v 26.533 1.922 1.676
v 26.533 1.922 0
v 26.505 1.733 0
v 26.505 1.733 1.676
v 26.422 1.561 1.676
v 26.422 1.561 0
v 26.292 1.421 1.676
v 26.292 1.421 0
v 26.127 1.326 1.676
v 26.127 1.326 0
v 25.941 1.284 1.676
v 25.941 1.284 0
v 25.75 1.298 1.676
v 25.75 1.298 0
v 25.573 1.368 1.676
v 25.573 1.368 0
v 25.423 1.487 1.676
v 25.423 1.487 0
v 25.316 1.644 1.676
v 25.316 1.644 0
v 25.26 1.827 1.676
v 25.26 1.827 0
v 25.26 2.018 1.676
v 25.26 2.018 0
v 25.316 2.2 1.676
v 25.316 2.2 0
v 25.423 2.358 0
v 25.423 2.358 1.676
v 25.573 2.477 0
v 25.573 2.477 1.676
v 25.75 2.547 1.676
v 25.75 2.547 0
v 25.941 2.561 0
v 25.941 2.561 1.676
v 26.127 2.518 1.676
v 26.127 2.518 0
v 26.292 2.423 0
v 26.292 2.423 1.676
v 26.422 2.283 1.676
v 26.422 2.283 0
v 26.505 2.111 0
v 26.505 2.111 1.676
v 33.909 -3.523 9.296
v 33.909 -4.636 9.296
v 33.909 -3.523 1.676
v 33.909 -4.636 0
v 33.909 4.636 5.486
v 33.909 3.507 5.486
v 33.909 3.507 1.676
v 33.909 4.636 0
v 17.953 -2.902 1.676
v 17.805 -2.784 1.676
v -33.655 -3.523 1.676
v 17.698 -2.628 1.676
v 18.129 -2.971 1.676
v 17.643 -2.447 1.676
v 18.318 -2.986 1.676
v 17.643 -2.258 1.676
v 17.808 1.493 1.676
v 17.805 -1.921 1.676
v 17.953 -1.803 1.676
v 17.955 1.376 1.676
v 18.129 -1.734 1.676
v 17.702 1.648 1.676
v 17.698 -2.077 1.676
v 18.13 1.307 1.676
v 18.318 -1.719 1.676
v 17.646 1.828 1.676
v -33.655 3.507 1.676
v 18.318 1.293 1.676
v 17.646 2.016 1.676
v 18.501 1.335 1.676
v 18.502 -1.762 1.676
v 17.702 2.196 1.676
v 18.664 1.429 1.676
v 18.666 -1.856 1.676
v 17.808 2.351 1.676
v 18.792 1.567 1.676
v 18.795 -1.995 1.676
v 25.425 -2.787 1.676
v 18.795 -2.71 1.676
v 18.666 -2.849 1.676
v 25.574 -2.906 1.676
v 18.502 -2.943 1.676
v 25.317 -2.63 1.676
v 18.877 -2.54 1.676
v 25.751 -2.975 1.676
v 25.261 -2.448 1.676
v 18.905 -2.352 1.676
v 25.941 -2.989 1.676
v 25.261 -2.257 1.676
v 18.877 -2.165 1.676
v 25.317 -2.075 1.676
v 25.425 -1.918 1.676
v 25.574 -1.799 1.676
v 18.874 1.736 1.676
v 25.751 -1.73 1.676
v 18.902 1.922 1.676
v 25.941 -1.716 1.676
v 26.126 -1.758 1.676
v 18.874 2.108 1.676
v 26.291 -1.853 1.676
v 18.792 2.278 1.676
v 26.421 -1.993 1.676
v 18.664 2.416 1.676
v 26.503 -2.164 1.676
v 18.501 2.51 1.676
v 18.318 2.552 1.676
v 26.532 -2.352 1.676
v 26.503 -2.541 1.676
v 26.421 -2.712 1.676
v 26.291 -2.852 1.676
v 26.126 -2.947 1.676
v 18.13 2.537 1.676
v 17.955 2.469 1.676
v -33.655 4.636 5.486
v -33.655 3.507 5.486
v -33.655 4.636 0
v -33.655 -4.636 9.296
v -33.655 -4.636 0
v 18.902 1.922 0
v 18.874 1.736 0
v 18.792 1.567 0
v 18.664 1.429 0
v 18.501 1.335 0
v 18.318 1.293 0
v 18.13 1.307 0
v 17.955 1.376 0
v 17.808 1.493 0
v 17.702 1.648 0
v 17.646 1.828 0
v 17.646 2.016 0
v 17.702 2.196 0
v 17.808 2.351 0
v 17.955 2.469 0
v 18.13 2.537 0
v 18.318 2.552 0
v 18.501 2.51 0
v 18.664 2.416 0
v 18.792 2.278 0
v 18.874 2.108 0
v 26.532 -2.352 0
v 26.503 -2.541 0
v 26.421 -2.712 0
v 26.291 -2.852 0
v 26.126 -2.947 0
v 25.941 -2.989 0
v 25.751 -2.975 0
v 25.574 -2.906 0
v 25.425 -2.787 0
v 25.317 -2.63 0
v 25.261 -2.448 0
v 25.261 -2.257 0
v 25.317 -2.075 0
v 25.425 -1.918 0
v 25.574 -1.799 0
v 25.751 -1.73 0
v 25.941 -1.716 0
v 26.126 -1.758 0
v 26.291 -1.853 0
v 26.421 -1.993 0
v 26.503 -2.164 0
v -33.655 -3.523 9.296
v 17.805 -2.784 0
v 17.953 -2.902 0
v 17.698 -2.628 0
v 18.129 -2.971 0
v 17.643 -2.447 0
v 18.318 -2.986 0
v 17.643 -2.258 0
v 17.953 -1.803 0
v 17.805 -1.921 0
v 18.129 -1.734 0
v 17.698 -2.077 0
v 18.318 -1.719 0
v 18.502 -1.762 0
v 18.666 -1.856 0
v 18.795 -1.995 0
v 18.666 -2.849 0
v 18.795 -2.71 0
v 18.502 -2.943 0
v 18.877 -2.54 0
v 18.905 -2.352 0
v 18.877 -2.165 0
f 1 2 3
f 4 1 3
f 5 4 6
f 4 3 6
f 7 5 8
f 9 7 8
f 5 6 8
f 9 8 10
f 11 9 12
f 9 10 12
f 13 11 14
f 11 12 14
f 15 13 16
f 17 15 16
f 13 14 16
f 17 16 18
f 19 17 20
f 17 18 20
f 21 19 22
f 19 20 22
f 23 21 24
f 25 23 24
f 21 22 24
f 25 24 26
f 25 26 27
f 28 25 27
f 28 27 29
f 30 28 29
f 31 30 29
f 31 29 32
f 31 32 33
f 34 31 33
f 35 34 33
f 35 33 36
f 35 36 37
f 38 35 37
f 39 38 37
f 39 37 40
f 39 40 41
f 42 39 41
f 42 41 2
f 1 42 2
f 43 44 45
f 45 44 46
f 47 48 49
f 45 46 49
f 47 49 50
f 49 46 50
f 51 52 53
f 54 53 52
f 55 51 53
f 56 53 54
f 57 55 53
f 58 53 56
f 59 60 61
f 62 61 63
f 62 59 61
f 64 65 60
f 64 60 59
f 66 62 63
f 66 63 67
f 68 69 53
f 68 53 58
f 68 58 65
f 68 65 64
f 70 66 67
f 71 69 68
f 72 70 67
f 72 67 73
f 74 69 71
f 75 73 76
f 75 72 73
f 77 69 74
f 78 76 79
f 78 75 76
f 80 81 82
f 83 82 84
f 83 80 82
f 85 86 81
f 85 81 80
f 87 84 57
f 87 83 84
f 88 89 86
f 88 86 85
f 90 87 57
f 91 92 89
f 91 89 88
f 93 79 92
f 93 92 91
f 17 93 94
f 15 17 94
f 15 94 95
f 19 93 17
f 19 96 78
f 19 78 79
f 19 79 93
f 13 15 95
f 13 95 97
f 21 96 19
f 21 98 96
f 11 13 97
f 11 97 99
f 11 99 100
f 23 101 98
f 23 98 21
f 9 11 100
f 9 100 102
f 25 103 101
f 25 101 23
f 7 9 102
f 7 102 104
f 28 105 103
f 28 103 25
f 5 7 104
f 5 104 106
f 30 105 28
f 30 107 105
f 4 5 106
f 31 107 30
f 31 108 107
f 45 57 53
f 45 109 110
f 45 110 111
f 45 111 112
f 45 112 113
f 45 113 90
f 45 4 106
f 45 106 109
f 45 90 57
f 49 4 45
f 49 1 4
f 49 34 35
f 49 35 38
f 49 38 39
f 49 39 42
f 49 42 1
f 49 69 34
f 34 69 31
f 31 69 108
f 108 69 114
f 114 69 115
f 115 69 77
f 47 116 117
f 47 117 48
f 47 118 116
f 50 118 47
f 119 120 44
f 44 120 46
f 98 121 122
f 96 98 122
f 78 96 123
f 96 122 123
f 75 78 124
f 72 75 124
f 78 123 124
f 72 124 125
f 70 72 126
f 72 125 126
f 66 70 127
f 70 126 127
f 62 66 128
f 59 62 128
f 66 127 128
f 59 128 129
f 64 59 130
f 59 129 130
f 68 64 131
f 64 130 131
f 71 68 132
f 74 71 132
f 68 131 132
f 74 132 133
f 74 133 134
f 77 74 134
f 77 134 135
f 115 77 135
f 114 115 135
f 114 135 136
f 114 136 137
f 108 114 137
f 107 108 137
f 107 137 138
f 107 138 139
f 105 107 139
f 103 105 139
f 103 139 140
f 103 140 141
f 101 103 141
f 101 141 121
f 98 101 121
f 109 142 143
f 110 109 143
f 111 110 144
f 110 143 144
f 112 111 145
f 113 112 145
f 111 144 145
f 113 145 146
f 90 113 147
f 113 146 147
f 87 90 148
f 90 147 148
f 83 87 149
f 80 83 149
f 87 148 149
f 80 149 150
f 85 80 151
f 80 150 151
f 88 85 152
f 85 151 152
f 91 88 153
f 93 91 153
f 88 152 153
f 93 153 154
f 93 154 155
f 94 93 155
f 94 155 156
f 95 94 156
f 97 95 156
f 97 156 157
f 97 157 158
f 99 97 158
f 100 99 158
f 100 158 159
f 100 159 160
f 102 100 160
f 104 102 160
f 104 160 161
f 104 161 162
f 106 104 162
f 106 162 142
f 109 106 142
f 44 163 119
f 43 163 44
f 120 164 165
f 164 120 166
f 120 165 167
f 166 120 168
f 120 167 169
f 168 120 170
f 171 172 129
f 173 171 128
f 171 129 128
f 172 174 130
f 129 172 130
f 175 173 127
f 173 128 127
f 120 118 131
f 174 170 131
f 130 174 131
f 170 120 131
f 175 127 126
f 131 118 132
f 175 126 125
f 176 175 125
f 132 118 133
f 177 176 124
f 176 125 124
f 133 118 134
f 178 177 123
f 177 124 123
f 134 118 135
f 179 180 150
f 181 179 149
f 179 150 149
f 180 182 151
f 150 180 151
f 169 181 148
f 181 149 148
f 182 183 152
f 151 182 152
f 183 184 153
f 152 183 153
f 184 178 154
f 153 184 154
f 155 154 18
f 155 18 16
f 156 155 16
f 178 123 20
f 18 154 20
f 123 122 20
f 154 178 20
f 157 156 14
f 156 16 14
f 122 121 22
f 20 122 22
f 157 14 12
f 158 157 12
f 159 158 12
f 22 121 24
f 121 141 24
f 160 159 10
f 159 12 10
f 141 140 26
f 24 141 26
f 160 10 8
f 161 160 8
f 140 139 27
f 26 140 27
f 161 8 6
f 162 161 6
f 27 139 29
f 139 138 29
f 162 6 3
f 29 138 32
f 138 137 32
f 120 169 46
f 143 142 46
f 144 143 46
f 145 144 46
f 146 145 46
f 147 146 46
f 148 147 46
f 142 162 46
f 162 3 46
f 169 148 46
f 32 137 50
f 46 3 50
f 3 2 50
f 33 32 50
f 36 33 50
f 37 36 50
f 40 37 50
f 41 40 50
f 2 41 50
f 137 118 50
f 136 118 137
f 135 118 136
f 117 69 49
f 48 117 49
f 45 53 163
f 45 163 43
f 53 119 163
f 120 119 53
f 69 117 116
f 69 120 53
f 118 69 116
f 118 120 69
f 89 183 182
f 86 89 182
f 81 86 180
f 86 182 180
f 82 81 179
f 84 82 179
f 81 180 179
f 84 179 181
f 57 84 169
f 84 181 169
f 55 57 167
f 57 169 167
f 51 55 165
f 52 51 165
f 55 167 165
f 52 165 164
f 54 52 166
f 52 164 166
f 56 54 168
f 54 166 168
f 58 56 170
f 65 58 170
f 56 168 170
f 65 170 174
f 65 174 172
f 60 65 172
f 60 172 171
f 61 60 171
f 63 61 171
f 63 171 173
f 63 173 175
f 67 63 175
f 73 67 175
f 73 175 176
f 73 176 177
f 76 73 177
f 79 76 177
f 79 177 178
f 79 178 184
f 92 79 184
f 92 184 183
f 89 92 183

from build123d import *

# Parameters (mm, degrees)
F0_W     = 67.564
F0_H     = 9.271
F1_DEPTH = 1.6764
F2_W     = 67.564
F2_H     = 1.11254
F3_DEPTH = 7.62
F2_H_2   = 1.128524
F4_DEPTH = 3.81
F5_R     = 0.638652
F5_R_2   = 0.640447
F5_R_3   = 0.63486
F5_R_4   = 0.631082
F6_DEPTH = 25.4


with BuildPart() as f1:
    # F0 (on Top) → F1 (new body)
    with BuildSketch(Plane.XY):
        with Locations((0.127, 0)):
            Rectangle(F0_W, F0_H)
    extrude(amount=F1_DEPTH)

    # F2 (on face) → F3 (join)
    with BuildSketch(Plane.XY.offset(1.6764)):
        with Locations((0.127, -4.07923)):
            Rectangle(F2_W, F2_H)
    extrude(amount=F3_DEPTH)

    # F2 (on face) → F4 (join)
    with BuildSketch(Plane.XY.offset(1.6764)):
        with Locations((0.127, 4.071238)):
            Rectangle(F2_W, F2_H_2)
    extrude(amount=F4_DEPTH)

    # F5 (on face) → F6 (cut)
    with BuildSketch(Plane(origin=(0, 0, 0), x_dir=(1, 0, 0), z_dir=(0, 0, -1))):
        with Locations((25.892904, 2.352488)):
            Circle(F5_R)
        with Locations((25.892904, -1.9222)):
            Circle(F5_R_2)
        with Locations((18.270466, 2.352488)):
            Circle(F5_R_3)
        with Locations((18.270466, -1.9222)):
            Circle(F5_R_4)
    extrude(amount=-F6_DEPTH, mode=Mode.SUBTRACT)


solid = f1.part
